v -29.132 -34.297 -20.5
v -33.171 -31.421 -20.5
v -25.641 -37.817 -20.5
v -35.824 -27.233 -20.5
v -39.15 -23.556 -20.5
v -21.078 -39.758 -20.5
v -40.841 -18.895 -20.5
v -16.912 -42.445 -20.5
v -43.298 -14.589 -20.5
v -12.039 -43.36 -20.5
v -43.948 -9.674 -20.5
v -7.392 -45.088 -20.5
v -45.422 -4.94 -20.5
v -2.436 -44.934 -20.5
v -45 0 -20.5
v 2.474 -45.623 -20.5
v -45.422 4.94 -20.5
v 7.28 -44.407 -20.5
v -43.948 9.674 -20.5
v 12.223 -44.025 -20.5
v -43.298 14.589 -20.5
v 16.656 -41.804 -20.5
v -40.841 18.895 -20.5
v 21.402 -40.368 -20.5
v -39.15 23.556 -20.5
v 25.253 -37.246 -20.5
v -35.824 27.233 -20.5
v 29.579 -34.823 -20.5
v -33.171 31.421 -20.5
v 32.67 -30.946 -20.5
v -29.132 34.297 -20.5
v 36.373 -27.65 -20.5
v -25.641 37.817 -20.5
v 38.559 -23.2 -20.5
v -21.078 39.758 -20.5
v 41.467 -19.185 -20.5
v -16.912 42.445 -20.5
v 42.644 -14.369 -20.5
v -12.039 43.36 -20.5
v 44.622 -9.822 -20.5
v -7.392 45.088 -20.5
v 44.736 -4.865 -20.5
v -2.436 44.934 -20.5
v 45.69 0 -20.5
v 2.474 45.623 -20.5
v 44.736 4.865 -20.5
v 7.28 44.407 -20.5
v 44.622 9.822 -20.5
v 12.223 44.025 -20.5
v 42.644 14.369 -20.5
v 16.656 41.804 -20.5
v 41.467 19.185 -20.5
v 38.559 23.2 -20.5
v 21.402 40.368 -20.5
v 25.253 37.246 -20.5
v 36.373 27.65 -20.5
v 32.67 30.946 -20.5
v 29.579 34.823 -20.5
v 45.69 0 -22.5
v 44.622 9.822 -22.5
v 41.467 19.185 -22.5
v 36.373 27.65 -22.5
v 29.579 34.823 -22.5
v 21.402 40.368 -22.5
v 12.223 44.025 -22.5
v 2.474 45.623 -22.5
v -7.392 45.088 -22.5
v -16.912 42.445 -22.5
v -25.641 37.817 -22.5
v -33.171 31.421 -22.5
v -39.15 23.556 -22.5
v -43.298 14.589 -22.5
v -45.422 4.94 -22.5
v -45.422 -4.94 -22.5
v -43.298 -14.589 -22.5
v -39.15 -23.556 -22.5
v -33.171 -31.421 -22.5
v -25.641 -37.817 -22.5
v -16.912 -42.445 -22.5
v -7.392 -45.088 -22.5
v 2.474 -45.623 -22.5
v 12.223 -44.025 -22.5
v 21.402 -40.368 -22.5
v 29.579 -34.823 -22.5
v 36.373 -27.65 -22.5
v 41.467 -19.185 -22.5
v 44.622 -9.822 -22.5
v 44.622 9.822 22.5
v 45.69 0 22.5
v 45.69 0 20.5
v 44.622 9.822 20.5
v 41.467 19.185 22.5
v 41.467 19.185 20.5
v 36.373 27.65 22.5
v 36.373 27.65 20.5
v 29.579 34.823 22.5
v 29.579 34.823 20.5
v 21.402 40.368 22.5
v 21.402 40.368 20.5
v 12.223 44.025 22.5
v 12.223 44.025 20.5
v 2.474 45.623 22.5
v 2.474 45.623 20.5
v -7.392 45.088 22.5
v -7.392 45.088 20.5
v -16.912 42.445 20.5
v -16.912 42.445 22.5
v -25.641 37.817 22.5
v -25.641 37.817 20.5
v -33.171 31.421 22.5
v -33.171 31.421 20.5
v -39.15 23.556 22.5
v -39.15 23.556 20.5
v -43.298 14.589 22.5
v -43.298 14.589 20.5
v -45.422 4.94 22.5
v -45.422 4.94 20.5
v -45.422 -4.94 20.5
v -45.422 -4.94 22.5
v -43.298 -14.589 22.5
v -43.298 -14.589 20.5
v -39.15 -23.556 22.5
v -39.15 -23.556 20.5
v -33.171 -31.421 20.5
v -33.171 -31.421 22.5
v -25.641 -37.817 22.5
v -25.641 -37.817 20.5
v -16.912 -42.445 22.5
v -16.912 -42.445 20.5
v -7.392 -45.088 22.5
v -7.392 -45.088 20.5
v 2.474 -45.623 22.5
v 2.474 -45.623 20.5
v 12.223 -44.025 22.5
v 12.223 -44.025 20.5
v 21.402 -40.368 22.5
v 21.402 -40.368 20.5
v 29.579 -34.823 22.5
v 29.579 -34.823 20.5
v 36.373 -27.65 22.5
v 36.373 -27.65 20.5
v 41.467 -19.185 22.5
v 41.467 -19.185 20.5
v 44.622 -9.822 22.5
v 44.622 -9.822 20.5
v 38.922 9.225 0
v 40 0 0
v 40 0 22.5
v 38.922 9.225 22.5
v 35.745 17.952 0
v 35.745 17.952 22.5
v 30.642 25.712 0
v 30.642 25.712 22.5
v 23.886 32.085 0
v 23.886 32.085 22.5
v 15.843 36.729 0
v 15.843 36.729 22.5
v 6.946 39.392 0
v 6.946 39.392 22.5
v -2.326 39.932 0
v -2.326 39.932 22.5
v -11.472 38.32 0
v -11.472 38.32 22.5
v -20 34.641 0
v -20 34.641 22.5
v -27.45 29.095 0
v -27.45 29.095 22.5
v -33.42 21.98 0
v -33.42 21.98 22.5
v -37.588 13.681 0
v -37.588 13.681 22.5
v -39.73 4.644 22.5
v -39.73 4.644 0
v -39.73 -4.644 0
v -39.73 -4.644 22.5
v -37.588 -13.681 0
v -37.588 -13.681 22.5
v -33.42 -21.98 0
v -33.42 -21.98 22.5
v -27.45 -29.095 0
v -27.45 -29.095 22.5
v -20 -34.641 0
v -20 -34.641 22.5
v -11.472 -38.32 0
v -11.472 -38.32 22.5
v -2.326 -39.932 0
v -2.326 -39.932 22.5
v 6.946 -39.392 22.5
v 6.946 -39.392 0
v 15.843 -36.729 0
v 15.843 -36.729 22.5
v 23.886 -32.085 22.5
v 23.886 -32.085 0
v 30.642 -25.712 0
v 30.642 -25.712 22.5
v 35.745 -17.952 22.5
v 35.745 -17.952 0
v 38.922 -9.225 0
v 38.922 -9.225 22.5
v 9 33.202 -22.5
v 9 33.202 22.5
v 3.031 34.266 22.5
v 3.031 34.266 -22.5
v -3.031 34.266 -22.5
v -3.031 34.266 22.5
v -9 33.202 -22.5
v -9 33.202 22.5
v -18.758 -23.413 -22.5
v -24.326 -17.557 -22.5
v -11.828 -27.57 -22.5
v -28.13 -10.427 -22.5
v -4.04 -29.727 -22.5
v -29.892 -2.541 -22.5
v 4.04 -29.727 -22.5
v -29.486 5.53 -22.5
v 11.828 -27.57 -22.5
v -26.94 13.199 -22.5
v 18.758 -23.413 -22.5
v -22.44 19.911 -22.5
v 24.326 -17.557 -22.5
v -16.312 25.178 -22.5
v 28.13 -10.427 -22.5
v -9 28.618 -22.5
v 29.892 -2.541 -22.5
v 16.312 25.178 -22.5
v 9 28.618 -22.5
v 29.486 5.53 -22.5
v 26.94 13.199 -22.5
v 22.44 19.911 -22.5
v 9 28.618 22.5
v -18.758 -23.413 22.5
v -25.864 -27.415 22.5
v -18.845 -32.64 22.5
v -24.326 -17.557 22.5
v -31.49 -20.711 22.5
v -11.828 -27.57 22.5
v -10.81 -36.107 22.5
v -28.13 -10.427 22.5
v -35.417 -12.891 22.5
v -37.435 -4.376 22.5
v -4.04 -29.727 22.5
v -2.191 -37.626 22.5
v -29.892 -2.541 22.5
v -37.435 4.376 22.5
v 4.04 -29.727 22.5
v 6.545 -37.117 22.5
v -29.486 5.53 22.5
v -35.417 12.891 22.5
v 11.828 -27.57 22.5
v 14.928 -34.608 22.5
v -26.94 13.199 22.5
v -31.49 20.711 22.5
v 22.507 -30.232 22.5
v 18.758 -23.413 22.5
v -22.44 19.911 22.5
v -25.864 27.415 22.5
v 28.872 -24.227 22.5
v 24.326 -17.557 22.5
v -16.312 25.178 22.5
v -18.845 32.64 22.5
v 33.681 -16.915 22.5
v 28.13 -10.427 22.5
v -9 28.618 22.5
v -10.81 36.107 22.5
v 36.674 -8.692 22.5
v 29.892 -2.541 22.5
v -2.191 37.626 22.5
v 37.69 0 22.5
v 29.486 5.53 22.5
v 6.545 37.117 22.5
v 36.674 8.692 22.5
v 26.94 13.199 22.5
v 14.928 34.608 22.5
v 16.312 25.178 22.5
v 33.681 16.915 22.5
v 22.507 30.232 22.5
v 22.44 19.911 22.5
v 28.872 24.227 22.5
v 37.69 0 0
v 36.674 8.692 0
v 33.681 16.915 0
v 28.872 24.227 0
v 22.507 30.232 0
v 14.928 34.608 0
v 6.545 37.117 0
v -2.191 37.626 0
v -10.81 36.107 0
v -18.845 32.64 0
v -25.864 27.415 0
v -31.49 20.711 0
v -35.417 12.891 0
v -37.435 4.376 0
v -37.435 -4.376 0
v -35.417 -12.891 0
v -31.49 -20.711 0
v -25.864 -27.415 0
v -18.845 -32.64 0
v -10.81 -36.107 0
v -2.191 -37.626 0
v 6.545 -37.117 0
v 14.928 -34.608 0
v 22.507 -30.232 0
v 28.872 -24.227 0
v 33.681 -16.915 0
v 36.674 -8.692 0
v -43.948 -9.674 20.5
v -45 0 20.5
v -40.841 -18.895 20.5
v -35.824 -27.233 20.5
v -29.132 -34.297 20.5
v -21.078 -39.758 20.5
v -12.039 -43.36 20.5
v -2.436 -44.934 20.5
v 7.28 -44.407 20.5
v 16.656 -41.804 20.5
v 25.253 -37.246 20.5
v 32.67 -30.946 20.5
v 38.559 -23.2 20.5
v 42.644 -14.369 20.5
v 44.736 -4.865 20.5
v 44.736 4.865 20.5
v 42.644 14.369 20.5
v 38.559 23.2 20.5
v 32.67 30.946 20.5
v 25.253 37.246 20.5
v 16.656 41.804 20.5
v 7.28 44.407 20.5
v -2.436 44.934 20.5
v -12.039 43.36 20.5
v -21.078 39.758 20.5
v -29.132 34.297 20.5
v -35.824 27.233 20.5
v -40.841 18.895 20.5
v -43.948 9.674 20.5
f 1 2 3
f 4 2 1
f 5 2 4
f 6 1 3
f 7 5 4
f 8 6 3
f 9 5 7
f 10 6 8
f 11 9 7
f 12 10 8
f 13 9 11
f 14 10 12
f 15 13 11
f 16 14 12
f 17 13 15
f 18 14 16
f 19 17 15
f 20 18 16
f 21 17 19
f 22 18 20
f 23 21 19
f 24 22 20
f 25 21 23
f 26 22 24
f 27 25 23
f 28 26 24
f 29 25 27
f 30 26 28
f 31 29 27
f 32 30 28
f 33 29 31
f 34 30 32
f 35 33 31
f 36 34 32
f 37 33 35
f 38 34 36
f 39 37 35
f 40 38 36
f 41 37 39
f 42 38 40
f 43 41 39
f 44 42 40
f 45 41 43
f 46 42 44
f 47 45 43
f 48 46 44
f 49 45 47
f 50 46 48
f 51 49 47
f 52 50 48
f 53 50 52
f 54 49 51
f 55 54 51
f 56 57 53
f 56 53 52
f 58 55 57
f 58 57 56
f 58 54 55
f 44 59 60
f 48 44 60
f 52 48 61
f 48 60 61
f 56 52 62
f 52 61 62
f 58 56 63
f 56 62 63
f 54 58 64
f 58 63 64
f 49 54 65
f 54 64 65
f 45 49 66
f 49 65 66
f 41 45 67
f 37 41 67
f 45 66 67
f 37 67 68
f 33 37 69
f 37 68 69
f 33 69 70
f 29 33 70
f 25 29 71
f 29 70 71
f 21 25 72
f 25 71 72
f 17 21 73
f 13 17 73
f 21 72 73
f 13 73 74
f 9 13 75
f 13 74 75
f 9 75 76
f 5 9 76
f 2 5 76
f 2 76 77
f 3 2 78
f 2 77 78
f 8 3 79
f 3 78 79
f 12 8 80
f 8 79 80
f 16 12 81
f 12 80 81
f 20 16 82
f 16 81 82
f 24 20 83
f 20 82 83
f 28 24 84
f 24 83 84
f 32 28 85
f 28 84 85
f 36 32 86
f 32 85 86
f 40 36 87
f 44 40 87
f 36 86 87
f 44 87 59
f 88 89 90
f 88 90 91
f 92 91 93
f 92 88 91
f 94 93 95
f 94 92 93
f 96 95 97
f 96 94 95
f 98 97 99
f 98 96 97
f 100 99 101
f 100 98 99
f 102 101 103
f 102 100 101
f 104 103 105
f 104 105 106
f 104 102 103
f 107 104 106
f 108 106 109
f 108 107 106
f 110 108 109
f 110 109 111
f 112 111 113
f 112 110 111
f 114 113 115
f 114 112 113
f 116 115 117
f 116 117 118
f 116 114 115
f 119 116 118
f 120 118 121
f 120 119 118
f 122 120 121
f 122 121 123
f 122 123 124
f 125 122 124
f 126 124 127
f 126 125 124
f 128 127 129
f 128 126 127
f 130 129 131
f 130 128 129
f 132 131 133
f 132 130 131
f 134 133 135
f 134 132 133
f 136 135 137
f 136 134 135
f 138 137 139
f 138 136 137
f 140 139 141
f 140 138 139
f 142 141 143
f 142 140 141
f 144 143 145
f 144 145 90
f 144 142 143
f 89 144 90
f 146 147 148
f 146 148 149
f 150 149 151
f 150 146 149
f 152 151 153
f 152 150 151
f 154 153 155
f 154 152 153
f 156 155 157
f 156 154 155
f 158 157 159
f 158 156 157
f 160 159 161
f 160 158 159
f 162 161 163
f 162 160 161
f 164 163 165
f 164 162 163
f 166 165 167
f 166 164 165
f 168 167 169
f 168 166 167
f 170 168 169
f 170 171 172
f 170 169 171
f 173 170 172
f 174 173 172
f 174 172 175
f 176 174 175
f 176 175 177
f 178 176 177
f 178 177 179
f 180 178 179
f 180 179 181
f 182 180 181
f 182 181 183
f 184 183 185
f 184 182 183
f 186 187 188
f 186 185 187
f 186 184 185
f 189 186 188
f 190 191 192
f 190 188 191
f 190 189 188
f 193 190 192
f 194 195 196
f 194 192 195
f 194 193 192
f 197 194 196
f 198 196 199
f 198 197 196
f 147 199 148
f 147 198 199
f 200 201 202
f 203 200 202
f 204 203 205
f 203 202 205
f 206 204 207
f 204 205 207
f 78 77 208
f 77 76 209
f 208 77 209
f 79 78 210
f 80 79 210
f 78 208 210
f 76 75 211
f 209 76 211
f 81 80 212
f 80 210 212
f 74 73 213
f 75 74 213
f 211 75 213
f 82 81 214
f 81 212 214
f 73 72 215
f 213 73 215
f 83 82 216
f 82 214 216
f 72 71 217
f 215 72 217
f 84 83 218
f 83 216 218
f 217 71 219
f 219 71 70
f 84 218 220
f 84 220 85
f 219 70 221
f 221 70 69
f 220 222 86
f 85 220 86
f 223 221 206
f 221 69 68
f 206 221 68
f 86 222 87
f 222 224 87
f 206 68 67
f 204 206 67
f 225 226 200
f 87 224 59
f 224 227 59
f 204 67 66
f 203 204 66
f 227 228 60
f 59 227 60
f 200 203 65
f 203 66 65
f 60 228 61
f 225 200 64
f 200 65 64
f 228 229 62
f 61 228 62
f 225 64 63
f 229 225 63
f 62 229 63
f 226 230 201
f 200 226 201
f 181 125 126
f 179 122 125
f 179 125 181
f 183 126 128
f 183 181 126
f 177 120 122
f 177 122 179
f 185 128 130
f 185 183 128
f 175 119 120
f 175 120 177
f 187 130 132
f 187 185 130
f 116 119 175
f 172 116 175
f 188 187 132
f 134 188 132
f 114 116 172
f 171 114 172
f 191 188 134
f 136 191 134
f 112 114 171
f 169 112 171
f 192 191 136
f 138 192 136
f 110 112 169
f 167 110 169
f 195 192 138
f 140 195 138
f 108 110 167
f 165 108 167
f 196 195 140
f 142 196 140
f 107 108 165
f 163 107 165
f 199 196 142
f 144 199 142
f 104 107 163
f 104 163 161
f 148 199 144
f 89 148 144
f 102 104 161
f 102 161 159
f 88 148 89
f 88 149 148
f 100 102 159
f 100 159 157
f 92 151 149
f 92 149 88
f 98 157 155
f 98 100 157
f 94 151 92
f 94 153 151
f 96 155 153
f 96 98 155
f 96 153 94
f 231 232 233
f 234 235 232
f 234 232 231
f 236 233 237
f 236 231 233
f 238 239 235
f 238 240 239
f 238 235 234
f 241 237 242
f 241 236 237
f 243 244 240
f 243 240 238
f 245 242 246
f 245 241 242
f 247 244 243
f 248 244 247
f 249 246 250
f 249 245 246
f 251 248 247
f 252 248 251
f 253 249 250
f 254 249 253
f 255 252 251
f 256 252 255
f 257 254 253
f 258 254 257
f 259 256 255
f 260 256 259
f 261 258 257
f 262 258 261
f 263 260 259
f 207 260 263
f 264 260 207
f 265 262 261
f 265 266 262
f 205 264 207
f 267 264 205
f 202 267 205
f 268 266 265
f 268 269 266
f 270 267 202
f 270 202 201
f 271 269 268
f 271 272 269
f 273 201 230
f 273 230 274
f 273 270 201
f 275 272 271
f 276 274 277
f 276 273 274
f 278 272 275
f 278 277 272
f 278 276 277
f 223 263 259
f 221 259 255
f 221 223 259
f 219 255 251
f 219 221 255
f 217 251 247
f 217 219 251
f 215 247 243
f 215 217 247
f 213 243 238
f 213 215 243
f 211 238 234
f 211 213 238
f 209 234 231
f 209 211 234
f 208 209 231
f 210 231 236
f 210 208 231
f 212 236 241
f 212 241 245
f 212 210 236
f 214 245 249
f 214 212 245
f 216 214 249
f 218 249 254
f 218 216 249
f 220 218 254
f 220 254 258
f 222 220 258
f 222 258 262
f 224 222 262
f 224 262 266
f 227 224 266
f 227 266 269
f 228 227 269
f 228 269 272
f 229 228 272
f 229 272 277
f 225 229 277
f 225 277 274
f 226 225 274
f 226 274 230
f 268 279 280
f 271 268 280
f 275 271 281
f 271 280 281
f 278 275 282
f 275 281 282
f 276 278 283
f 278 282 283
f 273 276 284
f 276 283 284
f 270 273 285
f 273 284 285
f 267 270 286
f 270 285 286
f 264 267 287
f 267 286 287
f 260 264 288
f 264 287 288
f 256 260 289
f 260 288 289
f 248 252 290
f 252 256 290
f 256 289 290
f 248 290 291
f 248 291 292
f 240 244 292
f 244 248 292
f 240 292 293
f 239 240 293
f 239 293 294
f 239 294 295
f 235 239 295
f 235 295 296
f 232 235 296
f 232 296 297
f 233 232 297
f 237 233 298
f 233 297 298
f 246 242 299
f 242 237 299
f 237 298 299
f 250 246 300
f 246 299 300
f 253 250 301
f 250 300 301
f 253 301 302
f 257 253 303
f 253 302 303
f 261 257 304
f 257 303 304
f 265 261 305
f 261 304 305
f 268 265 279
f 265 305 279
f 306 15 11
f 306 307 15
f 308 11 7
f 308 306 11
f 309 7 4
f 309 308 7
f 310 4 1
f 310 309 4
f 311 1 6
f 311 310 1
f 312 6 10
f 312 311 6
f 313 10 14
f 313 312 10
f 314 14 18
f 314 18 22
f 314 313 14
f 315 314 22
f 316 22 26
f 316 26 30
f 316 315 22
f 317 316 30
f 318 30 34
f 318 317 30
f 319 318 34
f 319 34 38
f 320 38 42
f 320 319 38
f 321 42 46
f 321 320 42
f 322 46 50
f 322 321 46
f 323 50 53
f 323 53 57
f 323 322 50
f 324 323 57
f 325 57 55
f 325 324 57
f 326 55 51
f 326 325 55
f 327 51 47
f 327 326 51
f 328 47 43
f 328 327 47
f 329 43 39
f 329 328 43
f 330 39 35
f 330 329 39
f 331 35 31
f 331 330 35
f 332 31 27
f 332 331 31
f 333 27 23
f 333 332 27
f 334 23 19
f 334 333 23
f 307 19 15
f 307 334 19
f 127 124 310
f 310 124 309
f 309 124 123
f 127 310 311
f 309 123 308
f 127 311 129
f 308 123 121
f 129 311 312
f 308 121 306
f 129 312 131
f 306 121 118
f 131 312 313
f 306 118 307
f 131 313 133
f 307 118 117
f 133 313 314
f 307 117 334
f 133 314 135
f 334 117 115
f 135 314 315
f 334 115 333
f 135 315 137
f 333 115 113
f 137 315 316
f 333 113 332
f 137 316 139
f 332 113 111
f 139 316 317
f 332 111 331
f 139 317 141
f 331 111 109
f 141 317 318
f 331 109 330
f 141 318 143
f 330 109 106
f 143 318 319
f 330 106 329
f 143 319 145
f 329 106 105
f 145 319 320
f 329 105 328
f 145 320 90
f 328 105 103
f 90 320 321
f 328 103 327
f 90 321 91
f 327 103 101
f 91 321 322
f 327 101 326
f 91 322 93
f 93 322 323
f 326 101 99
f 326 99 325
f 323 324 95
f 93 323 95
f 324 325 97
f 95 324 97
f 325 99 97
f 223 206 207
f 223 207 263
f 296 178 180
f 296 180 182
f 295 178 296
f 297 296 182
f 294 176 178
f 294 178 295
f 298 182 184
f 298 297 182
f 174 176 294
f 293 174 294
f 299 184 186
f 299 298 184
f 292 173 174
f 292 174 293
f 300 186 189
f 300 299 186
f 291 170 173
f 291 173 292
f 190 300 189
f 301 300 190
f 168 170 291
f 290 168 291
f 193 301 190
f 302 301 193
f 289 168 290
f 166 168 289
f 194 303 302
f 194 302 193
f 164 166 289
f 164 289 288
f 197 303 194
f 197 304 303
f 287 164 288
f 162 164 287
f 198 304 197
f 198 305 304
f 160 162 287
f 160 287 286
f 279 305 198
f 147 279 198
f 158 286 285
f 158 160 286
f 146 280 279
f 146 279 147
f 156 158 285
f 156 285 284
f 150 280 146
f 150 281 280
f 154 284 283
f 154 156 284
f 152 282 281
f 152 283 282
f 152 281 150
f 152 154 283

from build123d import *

# Parameters (mm, degrees)
SKETCH1_R               = 45
BOSS_EXTRUDE1_DEPTH     = 22.5
SKETCH2_R               = 45.69
BOSS_EXTRUDE2_DEPTH     = 2
SKETCH4_R               = 40
SKETCH4_R_2             = 37.69
CUT_EXTRUDE1_DEPTH      = 30
CUT_EXTRUDE2_DEPTH      = 79.741045205
CUT_EXTRUDE2_DEPTH_BACK = 79.741045205
SKETCH5_R               = 30
CUT_EXTRUDE3_DEPTH      = 79.741045205


with BuildPart() as part:
    # Sketch1 → Boss-Extrude1 (new, symmetric)
    with BuildSketch(Plane.XY):
        with Locations(Location((0, 0, 0), (0, 0, 180))):
            Circle(SKETCH1_R)
    extrude(amount=BOSS_EXTRUDE1_DEPTH, both=True)

    # Sketch2 → Boss-Extrude2 (add)
    with BuildSketch(Plane.XY.offset(22.5)):
        Circle(SKETCH2_R)
    boss_extrude2 = extrude(amount=-BOSS_EXTRUDE2_DEPTH)

    # Mirror1: Boss-Extrude2 across plane
    add(boss_extrude2.mirror(Plane.XY))

    # Sketch4 → Cut-Extrude1 (cut)
    with BuildSketch(Plane.XY):
        Circle(SKETCH4_R)
        Circle(SKETCH4_R_2, mode=Mode.SUBTRACT)
    extrude(amount=CUT_EXTRUDE1_DEPTH, mode=Mode.SUBTRACT)

    # Sketch5 → Cut-Extrude2 (cut, two sides: drawn at the far end of the back side and taken through both)
    with BuildSketch(Plane.XY.offset(22.5).offset(-CUT_EXTRUDE2_DEPTH_BACK)):
        Circle(SKETCH5_R)
    extrude(amount=CUT_EXTRUDE2_DEPTH + CUT_EXTRUDE2_DEPTH_BACK, mode=Mode.SUBTRACT)

    # Sketch6 → Cut-Extrude3 (cut, through all)
    with BuildSketch(Plane.XY.offset(22.5)):
        with BuildLine():
            Line((9, 20.17408731), (9, 33.20180718))
            ThreePointArc((9, 33.20180718), (0, 34.4), (-9, 33.20180718))
            Line((-9, 33.20180718), (-9, 20.17408731))
            Line((-9, 20.17408731), (9, 20.17408731))
        make_face()
    extrude(amount=-CUT_EXTRUDE3_DEPTH, mode=Mode.SUBTRACT)


solid = part.part
